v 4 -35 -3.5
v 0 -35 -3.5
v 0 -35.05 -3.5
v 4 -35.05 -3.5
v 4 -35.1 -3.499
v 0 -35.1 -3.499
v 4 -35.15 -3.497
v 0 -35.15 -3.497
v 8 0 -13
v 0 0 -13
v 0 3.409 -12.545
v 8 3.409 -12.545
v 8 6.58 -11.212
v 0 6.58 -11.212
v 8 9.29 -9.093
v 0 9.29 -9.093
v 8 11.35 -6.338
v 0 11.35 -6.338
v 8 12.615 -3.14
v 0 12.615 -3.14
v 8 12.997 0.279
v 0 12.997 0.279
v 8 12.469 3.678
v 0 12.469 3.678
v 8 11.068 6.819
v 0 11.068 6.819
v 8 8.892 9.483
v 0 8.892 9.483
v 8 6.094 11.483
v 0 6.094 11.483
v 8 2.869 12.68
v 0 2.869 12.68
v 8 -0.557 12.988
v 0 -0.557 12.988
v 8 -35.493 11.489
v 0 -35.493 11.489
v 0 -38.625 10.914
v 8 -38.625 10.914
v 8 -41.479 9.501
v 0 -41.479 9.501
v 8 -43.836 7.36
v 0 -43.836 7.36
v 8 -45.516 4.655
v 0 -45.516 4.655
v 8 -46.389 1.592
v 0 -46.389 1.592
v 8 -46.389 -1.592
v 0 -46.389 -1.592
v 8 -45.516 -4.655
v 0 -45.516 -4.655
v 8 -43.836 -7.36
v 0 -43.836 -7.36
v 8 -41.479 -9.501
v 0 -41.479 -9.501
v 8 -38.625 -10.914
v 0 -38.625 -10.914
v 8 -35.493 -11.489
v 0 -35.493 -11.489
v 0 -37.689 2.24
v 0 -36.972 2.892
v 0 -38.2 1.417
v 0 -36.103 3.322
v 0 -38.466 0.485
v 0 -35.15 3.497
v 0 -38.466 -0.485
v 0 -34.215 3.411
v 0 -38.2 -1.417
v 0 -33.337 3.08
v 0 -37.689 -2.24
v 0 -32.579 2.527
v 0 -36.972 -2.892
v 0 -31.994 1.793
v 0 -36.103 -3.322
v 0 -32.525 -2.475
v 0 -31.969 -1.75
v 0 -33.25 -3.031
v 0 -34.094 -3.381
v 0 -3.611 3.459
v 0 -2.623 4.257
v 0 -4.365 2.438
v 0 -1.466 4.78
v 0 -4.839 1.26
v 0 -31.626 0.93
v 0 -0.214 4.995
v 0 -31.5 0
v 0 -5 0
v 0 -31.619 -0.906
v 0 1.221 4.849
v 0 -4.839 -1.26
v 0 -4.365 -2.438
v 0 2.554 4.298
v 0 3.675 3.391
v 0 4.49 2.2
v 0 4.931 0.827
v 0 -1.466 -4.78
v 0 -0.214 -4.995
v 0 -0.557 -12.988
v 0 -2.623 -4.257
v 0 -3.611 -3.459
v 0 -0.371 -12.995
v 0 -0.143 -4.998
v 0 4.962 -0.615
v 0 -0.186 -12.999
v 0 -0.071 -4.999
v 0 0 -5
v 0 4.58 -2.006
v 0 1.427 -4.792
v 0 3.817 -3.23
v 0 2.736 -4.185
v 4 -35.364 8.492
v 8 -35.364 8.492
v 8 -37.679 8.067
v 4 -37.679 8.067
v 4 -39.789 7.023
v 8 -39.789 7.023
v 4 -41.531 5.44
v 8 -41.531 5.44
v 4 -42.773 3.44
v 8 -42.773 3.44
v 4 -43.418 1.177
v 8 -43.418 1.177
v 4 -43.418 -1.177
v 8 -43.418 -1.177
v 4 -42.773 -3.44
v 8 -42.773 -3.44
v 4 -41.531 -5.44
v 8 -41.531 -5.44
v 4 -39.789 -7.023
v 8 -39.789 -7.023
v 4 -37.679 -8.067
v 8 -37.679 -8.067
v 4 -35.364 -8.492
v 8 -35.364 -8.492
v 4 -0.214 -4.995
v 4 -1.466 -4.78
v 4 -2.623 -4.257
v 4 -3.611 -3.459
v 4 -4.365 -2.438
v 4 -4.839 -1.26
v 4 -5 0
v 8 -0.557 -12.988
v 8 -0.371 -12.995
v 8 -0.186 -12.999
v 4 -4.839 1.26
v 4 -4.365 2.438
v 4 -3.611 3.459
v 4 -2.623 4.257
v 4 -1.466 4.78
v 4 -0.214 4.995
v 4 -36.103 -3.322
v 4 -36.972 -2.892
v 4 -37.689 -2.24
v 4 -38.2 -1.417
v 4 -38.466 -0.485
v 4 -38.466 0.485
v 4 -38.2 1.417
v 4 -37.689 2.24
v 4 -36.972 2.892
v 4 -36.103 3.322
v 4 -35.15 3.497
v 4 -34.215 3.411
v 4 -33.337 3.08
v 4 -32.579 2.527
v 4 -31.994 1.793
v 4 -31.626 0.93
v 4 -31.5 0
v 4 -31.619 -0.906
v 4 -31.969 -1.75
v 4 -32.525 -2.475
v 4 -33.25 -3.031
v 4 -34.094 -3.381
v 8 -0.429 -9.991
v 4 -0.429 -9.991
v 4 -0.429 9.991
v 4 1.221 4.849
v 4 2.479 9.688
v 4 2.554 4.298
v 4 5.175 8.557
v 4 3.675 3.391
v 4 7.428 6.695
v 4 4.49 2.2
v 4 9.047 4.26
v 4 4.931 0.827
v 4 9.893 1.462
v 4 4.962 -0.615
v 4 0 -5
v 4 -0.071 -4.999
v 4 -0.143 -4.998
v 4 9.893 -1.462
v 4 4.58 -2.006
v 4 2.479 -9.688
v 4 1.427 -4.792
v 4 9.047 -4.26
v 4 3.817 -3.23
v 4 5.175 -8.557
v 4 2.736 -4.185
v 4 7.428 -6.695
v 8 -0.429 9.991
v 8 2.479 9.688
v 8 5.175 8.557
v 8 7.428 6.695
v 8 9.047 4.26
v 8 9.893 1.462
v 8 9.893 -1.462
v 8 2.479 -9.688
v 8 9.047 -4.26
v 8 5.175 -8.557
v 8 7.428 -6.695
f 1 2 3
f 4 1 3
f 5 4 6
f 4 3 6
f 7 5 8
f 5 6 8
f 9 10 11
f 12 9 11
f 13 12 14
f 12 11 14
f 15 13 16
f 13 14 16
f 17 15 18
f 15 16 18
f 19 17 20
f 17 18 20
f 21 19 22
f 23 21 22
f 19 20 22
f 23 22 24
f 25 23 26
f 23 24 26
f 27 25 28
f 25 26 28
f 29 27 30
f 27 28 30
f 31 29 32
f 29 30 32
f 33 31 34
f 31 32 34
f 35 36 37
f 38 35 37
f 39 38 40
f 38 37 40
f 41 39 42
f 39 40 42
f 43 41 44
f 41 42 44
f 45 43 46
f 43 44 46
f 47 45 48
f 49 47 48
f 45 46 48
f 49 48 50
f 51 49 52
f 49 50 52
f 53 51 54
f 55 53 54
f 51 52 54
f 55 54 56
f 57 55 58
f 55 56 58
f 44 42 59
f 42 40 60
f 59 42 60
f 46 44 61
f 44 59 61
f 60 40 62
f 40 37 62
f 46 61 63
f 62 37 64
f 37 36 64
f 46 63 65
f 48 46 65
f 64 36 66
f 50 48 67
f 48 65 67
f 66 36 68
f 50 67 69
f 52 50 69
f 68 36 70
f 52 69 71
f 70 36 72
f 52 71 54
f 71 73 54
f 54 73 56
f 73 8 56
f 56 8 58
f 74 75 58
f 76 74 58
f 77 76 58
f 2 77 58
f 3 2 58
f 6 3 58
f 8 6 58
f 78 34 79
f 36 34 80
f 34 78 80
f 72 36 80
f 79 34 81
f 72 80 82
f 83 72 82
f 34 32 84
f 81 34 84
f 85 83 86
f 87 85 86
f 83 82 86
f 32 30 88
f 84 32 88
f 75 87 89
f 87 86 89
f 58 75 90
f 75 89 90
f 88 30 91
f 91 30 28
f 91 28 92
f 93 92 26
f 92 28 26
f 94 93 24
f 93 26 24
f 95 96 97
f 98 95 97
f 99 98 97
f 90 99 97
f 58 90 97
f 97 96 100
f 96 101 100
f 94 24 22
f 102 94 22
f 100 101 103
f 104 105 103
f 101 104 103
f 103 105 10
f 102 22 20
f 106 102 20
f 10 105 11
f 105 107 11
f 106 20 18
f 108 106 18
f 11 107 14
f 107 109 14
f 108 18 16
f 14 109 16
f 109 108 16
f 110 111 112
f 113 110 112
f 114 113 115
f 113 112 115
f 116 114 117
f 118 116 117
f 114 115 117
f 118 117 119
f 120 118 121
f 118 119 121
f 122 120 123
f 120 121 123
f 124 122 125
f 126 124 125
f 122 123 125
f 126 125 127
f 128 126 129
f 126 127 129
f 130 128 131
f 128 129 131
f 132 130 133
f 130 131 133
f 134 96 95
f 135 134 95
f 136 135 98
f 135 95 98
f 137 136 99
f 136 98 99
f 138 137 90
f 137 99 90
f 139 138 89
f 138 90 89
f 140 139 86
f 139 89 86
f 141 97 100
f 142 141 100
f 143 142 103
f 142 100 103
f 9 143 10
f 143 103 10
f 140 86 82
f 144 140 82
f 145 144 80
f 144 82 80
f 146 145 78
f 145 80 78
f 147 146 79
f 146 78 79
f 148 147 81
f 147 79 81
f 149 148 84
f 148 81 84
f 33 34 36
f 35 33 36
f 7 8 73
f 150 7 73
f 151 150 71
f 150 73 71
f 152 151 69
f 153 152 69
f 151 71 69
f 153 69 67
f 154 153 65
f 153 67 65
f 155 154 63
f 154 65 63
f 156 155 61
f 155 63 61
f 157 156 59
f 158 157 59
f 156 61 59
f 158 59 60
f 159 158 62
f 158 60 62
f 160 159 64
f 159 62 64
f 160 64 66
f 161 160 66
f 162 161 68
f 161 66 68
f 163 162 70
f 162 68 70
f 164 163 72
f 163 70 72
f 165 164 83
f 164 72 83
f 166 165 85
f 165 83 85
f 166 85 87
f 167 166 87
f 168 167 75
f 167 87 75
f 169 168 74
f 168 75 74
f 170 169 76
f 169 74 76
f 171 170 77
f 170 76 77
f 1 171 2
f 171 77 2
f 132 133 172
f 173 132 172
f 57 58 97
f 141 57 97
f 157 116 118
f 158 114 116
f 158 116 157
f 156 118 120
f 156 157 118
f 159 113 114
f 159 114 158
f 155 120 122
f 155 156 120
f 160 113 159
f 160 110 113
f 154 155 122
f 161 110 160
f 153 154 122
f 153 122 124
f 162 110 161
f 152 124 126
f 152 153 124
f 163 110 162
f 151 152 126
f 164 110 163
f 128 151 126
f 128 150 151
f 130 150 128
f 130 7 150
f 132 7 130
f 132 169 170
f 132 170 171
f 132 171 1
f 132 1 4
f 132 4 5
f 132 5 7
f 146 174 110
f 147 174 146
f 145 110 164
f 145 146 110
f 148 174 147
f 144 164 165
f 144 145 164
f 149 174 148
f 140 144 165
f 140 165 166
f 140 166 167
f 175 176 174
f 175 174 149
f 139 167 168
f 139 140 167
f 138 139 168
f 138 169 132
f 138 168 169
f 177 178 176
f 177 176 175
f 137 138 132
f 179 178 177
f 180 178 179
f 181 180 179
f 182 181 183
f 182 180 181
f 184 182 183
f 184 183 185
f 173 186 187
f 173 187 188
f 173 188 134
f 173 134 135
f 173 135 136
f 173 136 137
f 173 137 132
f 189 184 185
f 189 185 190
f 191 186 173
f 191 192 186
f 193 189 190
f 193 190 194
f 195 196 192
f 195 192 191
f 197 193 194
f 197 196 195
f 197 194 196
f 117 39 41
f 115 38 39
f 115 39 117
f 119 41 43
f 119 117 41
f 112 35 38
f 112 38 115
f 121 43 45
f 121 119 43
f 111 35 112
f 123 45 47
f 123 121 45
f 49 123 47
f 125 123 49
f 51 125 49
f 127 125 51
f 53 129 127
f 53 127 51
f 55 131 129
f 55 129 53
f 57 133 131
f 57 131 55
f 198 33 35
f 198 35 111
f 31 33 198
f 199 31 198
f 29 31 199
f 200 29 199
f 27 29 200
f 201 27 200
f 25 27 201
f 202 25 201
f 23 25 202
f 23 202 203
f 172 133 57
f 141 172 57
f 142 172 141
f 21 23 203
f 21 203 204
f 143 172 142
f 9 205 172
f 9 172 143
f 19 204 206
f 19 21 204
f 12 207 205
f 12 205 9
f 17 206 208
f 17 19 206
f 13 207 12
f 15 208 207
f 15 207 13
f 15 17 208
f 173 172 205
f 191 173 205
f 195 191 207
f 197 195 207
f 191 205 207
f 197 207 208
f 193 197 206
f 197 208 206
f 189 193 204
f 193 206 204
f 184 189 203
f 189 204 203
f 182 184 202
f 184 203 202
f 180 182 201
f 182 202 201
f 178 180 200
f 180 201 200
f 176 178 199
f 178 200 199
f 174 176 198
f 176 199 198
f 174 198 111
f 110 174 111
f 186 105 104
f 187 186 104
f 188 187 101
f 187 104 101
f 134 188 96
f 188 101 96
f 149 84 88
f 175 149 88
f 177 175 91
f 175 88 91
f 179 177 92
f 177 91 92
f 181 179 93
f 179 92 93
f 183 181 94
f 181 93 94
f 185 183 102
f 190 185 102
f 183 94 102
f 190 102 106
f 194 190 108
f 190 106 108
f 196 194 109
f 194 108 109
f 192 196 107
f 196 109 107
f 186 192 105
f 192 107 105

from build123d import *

# Parameters (mm, degrees)
EXTRUDE_1_DEPTH     = 4
EXTRUDE_2_DEPTH     = 8
CUT_EXTRUDE_1_DEPTH = 4


with BuildPart() as part:
    # Эскиз1 → Бобышка-Вытянуть1 (new body)
    with BuildSketch(Plane(origin=(0, 0, 0), x_dir=(0, 0, -1), z_dir=(1, 0, 0))):
        with BuildLine():
            Line((-7.553494652, -10.580393119), (-7.992649685, -0.342857143))
            ThreePointArc((-7.992649685, -0.342857143), (-0.171467962, 7.99816221), (8, 0))
            ThreePointArc((8, 0), (7.99816221, -0.171467962), (7.992649685, -0.342857143))
            Line((7.992649685, -0.342857143), (7.553494652, -10.580393119))
            ThreePointArc((7.553494652, -10.580393119), (11.428263628, -6.196352996), (12.988055737, -0.557142857))
            ThreePointArc((12.988055737, -0.557142857), (12.997013591, -0.278635438), (13, 0))
            ThreePointArc((13, 0), (-0.278635438, 12.997013591), (-12.988055737, -0.557142857))
            ThreePointArc((-12.988055737, -0.557142857), (-11.428263628, -6.196352996), (-7.553494652, -10.580393119))
        make_face()
        with BuildLine():
            Line((-4.727763281, -6.453545875), (-4.995406053, -0.214285714))
            ThreePointArc((-4.995406053, -0.214285714), (-0.107167476, 4.998851381), (5, 0))
            ThreePointArc((5, 0), (4.998851381, -0.107167476), (4.995406053, -0.214285714))
            Line((4.995406053, -0.214285714), (4.727763281, -6.453545875))
            ThreePointArc((4.727763281, -6.453545875), (7.056015568, -3.769966087), (7.992649685, -0.342857143))
            ThreePointArc((7.992649685, -0.342857143), (7.99816221, -0.171467962), (8, 0))
            ThreePointArc((8, 0), (-0.171467962, 7.99816221), (-7.992649685, -0.342857143))
            ThreePointArc((-7.992649685, -0.342857143), (-7.056015568, -3.769966087), (-4.727763281, -6.453545875))
        make_face()
        with BuildLine():
            Line((0, -8), (0, -5))
            ThreePointArc((0, -5), (-3.458942861, -3.610500559), (-4.995406053, -0.214285714))
            Line((-4.995406053, -0.214285714), (-4.727763281, -6.453545875))
            ThreePointArc((-4.727763281, -6.453545875), (-2.487130174, -7.603563868), (0, -8))
        make_face()
        with BuildLine():
            ThreePointArc((4.995406053, -0.214285714), (3.458942861, -3.610500559), (0, -5))
            Line((0, -5), (0, -8))
            ThreePointArc((0, -8), (2.487130174, -7.603563868), (4.727763281, -6.453545875))
            Line((4.727763281, -6.453545875), (4.995406053, -0.214285714))
        make_face()
        with BuildLine():
            ThreePointArc((4.727763281, -6.453545875), (2.487130174, -7.603563868), (0, -8))
            Line((0, -8), (0, -13))
            ThreePointArc((0, -13), (2.275699548, -12.799265274), (4.481120339, -12.203260241))
            Line((4.481120339, -12.203260241), (4.727763281, -6.453545875))
        make_face()
        with BuildLine():
            ThreePointArc((7.992649685, -0.342857143), (7.056015568, -3.769966087), (4.727763281, -6.453545875))
            Line((4.727763281, -6.453545875), (4.481120339, -12.203260241))
            ThreePointArc((4.481120339, -12.203260241), (6.071771893, -11.494937411), (7.553494652, -10.580393119))
            Line((7.553494652, -10.580393119), (7.992649685, -0.342857143))
        make_face()
        with BuildLine():
            Line((0, -13), (0, -8))
            ThreePointArc((0, -8), (-2.487130174, -7.603563868), (-4.727763281, -6.453545875))
            Line((-4.727763281, -6.453545875), (-4.481120339, -12.203260241))
            ThreePointArc((-4.481120339, -12.203260241), (-2.275699548, -12.799265274), (0, -13))
        make_face()
        with BuildLine():
            Line((-4.481120339, -12.203260241), (-4.727763281, -6.453545875))
            ThreePointArc((-4.727763281, -6.453545875), (-7.056015568, -3.769966087), (-7.992649685, -0.342857143))
            Line((-7.992649685, -0.342857143), (-7.553494652, -10.580393119))
            ThreePointArc((-7.553494652, -10.580393119), (-6.071771893, -11.494937411), (-4.481120339, -12.203260241))
        make_face()
        with BuildLine():
            Line((-3.966260715, -24.205613684), (-4.481120339, -12.203260241))
            ThreePointArc((-4.481120339, -12.203260241), (-6.071771893, -11.494937411), (-7.553494652, -10.580393119))
            Line((-7.553494652, -10.580393119), (-6.900606425, -25.80045485))
            ThreePointArc((-6.900606425, -25.80045485), (-5.491637274, -24.895945366), (-3.966260715, -24.205613684))
        make_face()
        with BuildLine():
            Line((-6.900606425, -25.80045485), (-7.553494652, -10.580393119))
            ThreePointArc((-7.553494652, -10.580393119), (-11.428263628, -6.196352996), (-12.988055737, -0.557142857))
            Line((-12.988055737, -0.557142857), (-11.489433922, -35.492857143))
            ThreePointArc((-11.489433922, -35.492857143), (-10.393943503, -30.07903074), (-6.900606425, -25.80045485))
        make_face()
        with BuildLine():
            Line((0, -23.5), (0, -13))
            ThreePointArc((0, -13), (-2.275699548, -12.799265274), (-4.481120339, -12.203260241))
            Line((-4.481120339, -12.203260241), (-3.966260715, -24.205613684))
            ThreePointArc((-3.966260715, -24.205613684), (-2.014268771, -23.677777545), (0, -23.5))
        make_face()
        with BuildLine():
            ThreePointArc((4.481120339, -12.203260241), (2.275699548, -12.799265274), (0, -13))
            Line((0, -13), (0, -23.5))
            ThreePointArc((0, -23.5), (2.014268771, -23.677777545), (3.966260715, -24.205613684))
            Line((3.966260715, -24.205613684), (4.481120339, -12.203260241))
        make_face()
        with BuildLine():
            ThreePointArc((7.553494652, -10.580393119), (6.071771893, -11.494937411), (4.481120339, -12.203260241))
            Line((4.481120339, -12.203260241), (3.966260715, -24.205613684))
            ThreePointArc((3.966260715, -24.205613684), (5.491637274, -24.895945366), (6.900606425, -25.80045485))
            Line((6.900606425, -25.80045485), (7.553494652, -10.580393119))
        make_face()
        with BuildLine():
            ThreePointArc((12.988055737, -0.557142857), (11.428263628, -6.196352996), (7.553494652, -10.580393119))
            Line((7.553494652, -10.580393119), (6.900606425, -25.80045485))
            ThreePointArc((6.900606425, -25.80045485), (10.286082196, -29.857382665), (11.5, -35))
            ThreePointArc((11.5, -35), (11.497358177, -35.246485195), (11.489433922, -35.492857143))
            Line((11.489433922, -35.492857143), (12.988055737, -0.557142857))
        make_face()
        with BuildLine():
            ThreePointArc((11.5, -35), (10.286082196, -29.857382665), (6.900606425, -25.80045485))
            Line((6.900606425, -25.80045485), (6.494027869, -35.278571429))
            ThreePointArc((6.494027869, -35.278571429), (0, -41.5), (-6.494027869, -35.278571429))
            Line((-6.494027869, -35.278571429), (-6.900606425, -25.80045485))
            ThreePointArc((-6.900606425, -25.80045485), (-10.393943503, -30.07903074), (-11.489433922, -35.492857143))
            ThreePointArc((-11.489433922, -35.492857143), (0, -46.5), (11.489433922, -35.492857143))
            ThreePointArc((11.489433922, -35.492857143), (11.497358177, -35.246485195), (11.5, -35))
        make_face()
        with BuildLine():
            ThreePointArc((6.5, -35), (5.766493566, -32.000408036), (3.731522476, -29.677806842))
            Line((3.731522476, -29.677806842), (3.496784237, -35.15))
            ThreePointArc((3.496784237, -35.15), (0, -38.5), (-3.496784237, -35.15))
            Line((-3.496784237, -35.15), (-3.731522476, -29.677806842))
            ThreePointArc((-3.731522476, -29.677806842), (-5.829460606, -32.124693225), (-6.494027869, -35.278571429))
            ThreePointArc((-6.494027869, -35.278571429), (0, -41.5), (6.494027869, -35.278571429))
            ThreePointArc((6.494027869, -35.278571429), (6.498506796, -35.139317719), (6.5, -35))
        make_face()
        with BuildLine():
            Line((-3.731522476, -29.677806842), (-3.966260715, -24.205613684))
            ThreePointArc((-3.966260715, -24.205613684), (-5.491637274, -24.895945366), (-6.900606425, -25.80045485))
            Line((-6.900606425, -25.80045485), (-6.494027869, -35.278571429))
            ThreePointArc((-6.494027869, -35.278571429), (-5.829460606, -32.124693225), (-3.731522476, -29.677806842))
        make_face()
        with BuildLine():
            Line((0, -28.5), (0, -23.5))
            ThreePointArc((0, -23.5), (-2.014268771, -23.677777545), (-3.966260715, -24.205613684))
            Line((-3.966260715, -24.205613684), (-3.731522476, -29.677806842))
            ThreePointArc((-3.731522476, -29.677806842), (-1.956494885, -28.801441477), (0, -28.5))
        make_face()
        with BuildLine():
            ThreePointArc((3.966260715, -24.205613684), (2.014268771, -23.677777545), (0, -23.5))
            Line((0, -23.5), (0, -28.5))
            ThreePointArc((0, -28.5), (1.956494885, -28.801441477), (3.731522476, -29.677806842))
            Line((3.731522476, -29.677806842), (3.966260715, -24.205613684))
        make_face()
        with BuildLine():
            Line((0, -31.5), (0, -28.5))
            ThreePointArc((0, -28.5), (-1.956494885, -28.801441477), (-3.731522476, -29.677806842))
            Line((-3.731522476, -29.677806842), (-3.496784237, -35.15))
            ThreePointArc((-3.496784237, -35.15), (-2.527350391, -32.578739997), (0, -31.5))
        make_face()
        with BuildLine():
            ThreePointArc((3.731522476, -29.677806842), (1.956494885, -28.801441477), (0, -28.5))
            Line((0, -28.5), (0, -31.5))
            ThreePointArc((0, -31.5), (2.474873734, -32.525126266), (3.5, -35))
            ThreePointArc((3.5, -35), (3.499195967, -35.075017233), (3.496784237, -35.15))
            Line((3.496784237, -35.15), (3.731522476, -29.677806842))
        make_face()
        with BuildLine():
            ThreePointArc((6.900606425, -25.80045485), (5.491637274, -24.895945366), (3.966260715, -24.205613684))
            Line((3.966260715, -24.205613684), (3.731522476, -29.677806842))
            ThreePointArc((3.731522476, -29.677806842), (5.766493566, -32.000408036), (6.5, -35))
            ThreePointArc((6.5, -35), (6.498506796, -35.139317719), (6.494027869, -35.278571429))
            Line((6.494027869, -35.278571429), (6.900606425, -25.80045485))
        make_face()
    extrude(amount=EXTRUDE_1_DEPTH)

    # Эскиз1<5> → Бобышка-Вытянуть2 (add)
    with BuildSketch(Plane(origin=(0, 0, 0), x_dir=(0, 0, -1), z_dir=(1, 0, 0))):
        with BuildLine():
            Line((-6.900606425, -25.80045485), (-7.553494652, -10.580393119))
            ThreePointArc((-7.553494652, -10.580393119), (-11.428263628, -6.196352996), (-12.988055737, -0.557142857))
            Line((-12.988055737, -0.557142857), (-11.489433922, -35.492857143))
            ThreePointArc((-11.489433922, -35.492857143), (-10.393943503, -30.07903074), (-6.900606425, -25.80045485))
        make_face()
        with BuildLine():
            Line((-6.494027869, -35.278571429), (-6.900606425, -25.80045485))
            ThreePointArc((-6.900606425, -25.80045485), (-10.393943503, -30.07903074), (-11.489433922, -35.492857143))
            ThreePointArc((-11.489433922, -35.492857143), (0, -46.5), (11.489433922, -35.492857143))
            ThreePointArc((11.489433922, -35.492857143), (11.497358177, -35.246485195), (11.5, -35))
            ThreePointArc((11.5, -35), (10.286082196, -29.857382665), (6.900606425, -25.80045485))
            Line((6.900606425, -25.80045485), (6.494027869, -35.278571429))
            ThreePointArc((6.494027869, -35.278571429), (0, -41.5), (-6.494027869, -35.278571429))
        make_face()
        with BuildLine():
            ThreePointArc((12.988055737, -0.557142857), (11.428263628, -6.196352996), (7.553494652, -10.580393119))
            Line((7.553494652, -10.580393119), (6.900606425, -25.80045485))
            ThreePointArc((6.900606425, -25.80045485), (10.286082196, -29.857382665), (11.5, -35))
            ThreePointArc((11.5, -35), (11.497358177, -35.246485195), (11.489433922, -35.492857143))
            Line((11.489433922, -35.492857143), (12.988055737, -0.557142857))
        make_face()
        with BuildLine():
            Line((-7.553494652, -10.580393119), (-7.992649685, -0.342857143))
            ThreePointArc((-7.992649685, -0.342857143), (-0.171467962, 7.99816221), (8, 0))
            ThreePointArc((8, 0), (7.99816221, -0.171467962), (7.992649685, -0.342857143))
            Line((7.992649685, -0.342857143), (7.553494652, -10.580393119))
            ThreePointArc((7.553494652, -10.580393119), (11.428263628, -6.196352996), (12.988055737, -0.557142857))
            ThreePointArc((12.988055737, -0.557142857), (12.997013591, -0.278635438), (13, 0))
            ThreePointArc((13, 0), (-0.278635438, 12.997013591), (-12.988055737, -0.557142857))
            ThreePointArc((-12.988055737, -0.557142857), (-11.428263628, -6.196352996), (-7.553494652, -10.580393119))
        make_face()
    extrude(amount=EXTRUDE_2_DEPTH)

    # Эскиз2 → Вырез-Вытянуть1 (cut)
    with BuildSketch(Plane(origin=(8, 0, 0), x_dir=(0, 0, -1), z_dir=(1, 0, 0))):
        with BuildLine():
            Line((-9.990812106, -0.428571429), (-8.49219029, -35.364285714))
            ThreePointArc((-8.49219029, -35.364285714), (0, -43.5), (8.49219029, -35.364285714))
            Line((8.49219029, -35.364285714), (9.990812106, -0.428571429))
            ThreePointArc((9.990812106, -0.428571429), (0, 10), (-9.990812106, -0.428571429))
        make_face()
    extrude(amount=-CUT_EXTRUDE_1_DEPTH, mode=Mode.SUBTRACT)


solid = part.part
